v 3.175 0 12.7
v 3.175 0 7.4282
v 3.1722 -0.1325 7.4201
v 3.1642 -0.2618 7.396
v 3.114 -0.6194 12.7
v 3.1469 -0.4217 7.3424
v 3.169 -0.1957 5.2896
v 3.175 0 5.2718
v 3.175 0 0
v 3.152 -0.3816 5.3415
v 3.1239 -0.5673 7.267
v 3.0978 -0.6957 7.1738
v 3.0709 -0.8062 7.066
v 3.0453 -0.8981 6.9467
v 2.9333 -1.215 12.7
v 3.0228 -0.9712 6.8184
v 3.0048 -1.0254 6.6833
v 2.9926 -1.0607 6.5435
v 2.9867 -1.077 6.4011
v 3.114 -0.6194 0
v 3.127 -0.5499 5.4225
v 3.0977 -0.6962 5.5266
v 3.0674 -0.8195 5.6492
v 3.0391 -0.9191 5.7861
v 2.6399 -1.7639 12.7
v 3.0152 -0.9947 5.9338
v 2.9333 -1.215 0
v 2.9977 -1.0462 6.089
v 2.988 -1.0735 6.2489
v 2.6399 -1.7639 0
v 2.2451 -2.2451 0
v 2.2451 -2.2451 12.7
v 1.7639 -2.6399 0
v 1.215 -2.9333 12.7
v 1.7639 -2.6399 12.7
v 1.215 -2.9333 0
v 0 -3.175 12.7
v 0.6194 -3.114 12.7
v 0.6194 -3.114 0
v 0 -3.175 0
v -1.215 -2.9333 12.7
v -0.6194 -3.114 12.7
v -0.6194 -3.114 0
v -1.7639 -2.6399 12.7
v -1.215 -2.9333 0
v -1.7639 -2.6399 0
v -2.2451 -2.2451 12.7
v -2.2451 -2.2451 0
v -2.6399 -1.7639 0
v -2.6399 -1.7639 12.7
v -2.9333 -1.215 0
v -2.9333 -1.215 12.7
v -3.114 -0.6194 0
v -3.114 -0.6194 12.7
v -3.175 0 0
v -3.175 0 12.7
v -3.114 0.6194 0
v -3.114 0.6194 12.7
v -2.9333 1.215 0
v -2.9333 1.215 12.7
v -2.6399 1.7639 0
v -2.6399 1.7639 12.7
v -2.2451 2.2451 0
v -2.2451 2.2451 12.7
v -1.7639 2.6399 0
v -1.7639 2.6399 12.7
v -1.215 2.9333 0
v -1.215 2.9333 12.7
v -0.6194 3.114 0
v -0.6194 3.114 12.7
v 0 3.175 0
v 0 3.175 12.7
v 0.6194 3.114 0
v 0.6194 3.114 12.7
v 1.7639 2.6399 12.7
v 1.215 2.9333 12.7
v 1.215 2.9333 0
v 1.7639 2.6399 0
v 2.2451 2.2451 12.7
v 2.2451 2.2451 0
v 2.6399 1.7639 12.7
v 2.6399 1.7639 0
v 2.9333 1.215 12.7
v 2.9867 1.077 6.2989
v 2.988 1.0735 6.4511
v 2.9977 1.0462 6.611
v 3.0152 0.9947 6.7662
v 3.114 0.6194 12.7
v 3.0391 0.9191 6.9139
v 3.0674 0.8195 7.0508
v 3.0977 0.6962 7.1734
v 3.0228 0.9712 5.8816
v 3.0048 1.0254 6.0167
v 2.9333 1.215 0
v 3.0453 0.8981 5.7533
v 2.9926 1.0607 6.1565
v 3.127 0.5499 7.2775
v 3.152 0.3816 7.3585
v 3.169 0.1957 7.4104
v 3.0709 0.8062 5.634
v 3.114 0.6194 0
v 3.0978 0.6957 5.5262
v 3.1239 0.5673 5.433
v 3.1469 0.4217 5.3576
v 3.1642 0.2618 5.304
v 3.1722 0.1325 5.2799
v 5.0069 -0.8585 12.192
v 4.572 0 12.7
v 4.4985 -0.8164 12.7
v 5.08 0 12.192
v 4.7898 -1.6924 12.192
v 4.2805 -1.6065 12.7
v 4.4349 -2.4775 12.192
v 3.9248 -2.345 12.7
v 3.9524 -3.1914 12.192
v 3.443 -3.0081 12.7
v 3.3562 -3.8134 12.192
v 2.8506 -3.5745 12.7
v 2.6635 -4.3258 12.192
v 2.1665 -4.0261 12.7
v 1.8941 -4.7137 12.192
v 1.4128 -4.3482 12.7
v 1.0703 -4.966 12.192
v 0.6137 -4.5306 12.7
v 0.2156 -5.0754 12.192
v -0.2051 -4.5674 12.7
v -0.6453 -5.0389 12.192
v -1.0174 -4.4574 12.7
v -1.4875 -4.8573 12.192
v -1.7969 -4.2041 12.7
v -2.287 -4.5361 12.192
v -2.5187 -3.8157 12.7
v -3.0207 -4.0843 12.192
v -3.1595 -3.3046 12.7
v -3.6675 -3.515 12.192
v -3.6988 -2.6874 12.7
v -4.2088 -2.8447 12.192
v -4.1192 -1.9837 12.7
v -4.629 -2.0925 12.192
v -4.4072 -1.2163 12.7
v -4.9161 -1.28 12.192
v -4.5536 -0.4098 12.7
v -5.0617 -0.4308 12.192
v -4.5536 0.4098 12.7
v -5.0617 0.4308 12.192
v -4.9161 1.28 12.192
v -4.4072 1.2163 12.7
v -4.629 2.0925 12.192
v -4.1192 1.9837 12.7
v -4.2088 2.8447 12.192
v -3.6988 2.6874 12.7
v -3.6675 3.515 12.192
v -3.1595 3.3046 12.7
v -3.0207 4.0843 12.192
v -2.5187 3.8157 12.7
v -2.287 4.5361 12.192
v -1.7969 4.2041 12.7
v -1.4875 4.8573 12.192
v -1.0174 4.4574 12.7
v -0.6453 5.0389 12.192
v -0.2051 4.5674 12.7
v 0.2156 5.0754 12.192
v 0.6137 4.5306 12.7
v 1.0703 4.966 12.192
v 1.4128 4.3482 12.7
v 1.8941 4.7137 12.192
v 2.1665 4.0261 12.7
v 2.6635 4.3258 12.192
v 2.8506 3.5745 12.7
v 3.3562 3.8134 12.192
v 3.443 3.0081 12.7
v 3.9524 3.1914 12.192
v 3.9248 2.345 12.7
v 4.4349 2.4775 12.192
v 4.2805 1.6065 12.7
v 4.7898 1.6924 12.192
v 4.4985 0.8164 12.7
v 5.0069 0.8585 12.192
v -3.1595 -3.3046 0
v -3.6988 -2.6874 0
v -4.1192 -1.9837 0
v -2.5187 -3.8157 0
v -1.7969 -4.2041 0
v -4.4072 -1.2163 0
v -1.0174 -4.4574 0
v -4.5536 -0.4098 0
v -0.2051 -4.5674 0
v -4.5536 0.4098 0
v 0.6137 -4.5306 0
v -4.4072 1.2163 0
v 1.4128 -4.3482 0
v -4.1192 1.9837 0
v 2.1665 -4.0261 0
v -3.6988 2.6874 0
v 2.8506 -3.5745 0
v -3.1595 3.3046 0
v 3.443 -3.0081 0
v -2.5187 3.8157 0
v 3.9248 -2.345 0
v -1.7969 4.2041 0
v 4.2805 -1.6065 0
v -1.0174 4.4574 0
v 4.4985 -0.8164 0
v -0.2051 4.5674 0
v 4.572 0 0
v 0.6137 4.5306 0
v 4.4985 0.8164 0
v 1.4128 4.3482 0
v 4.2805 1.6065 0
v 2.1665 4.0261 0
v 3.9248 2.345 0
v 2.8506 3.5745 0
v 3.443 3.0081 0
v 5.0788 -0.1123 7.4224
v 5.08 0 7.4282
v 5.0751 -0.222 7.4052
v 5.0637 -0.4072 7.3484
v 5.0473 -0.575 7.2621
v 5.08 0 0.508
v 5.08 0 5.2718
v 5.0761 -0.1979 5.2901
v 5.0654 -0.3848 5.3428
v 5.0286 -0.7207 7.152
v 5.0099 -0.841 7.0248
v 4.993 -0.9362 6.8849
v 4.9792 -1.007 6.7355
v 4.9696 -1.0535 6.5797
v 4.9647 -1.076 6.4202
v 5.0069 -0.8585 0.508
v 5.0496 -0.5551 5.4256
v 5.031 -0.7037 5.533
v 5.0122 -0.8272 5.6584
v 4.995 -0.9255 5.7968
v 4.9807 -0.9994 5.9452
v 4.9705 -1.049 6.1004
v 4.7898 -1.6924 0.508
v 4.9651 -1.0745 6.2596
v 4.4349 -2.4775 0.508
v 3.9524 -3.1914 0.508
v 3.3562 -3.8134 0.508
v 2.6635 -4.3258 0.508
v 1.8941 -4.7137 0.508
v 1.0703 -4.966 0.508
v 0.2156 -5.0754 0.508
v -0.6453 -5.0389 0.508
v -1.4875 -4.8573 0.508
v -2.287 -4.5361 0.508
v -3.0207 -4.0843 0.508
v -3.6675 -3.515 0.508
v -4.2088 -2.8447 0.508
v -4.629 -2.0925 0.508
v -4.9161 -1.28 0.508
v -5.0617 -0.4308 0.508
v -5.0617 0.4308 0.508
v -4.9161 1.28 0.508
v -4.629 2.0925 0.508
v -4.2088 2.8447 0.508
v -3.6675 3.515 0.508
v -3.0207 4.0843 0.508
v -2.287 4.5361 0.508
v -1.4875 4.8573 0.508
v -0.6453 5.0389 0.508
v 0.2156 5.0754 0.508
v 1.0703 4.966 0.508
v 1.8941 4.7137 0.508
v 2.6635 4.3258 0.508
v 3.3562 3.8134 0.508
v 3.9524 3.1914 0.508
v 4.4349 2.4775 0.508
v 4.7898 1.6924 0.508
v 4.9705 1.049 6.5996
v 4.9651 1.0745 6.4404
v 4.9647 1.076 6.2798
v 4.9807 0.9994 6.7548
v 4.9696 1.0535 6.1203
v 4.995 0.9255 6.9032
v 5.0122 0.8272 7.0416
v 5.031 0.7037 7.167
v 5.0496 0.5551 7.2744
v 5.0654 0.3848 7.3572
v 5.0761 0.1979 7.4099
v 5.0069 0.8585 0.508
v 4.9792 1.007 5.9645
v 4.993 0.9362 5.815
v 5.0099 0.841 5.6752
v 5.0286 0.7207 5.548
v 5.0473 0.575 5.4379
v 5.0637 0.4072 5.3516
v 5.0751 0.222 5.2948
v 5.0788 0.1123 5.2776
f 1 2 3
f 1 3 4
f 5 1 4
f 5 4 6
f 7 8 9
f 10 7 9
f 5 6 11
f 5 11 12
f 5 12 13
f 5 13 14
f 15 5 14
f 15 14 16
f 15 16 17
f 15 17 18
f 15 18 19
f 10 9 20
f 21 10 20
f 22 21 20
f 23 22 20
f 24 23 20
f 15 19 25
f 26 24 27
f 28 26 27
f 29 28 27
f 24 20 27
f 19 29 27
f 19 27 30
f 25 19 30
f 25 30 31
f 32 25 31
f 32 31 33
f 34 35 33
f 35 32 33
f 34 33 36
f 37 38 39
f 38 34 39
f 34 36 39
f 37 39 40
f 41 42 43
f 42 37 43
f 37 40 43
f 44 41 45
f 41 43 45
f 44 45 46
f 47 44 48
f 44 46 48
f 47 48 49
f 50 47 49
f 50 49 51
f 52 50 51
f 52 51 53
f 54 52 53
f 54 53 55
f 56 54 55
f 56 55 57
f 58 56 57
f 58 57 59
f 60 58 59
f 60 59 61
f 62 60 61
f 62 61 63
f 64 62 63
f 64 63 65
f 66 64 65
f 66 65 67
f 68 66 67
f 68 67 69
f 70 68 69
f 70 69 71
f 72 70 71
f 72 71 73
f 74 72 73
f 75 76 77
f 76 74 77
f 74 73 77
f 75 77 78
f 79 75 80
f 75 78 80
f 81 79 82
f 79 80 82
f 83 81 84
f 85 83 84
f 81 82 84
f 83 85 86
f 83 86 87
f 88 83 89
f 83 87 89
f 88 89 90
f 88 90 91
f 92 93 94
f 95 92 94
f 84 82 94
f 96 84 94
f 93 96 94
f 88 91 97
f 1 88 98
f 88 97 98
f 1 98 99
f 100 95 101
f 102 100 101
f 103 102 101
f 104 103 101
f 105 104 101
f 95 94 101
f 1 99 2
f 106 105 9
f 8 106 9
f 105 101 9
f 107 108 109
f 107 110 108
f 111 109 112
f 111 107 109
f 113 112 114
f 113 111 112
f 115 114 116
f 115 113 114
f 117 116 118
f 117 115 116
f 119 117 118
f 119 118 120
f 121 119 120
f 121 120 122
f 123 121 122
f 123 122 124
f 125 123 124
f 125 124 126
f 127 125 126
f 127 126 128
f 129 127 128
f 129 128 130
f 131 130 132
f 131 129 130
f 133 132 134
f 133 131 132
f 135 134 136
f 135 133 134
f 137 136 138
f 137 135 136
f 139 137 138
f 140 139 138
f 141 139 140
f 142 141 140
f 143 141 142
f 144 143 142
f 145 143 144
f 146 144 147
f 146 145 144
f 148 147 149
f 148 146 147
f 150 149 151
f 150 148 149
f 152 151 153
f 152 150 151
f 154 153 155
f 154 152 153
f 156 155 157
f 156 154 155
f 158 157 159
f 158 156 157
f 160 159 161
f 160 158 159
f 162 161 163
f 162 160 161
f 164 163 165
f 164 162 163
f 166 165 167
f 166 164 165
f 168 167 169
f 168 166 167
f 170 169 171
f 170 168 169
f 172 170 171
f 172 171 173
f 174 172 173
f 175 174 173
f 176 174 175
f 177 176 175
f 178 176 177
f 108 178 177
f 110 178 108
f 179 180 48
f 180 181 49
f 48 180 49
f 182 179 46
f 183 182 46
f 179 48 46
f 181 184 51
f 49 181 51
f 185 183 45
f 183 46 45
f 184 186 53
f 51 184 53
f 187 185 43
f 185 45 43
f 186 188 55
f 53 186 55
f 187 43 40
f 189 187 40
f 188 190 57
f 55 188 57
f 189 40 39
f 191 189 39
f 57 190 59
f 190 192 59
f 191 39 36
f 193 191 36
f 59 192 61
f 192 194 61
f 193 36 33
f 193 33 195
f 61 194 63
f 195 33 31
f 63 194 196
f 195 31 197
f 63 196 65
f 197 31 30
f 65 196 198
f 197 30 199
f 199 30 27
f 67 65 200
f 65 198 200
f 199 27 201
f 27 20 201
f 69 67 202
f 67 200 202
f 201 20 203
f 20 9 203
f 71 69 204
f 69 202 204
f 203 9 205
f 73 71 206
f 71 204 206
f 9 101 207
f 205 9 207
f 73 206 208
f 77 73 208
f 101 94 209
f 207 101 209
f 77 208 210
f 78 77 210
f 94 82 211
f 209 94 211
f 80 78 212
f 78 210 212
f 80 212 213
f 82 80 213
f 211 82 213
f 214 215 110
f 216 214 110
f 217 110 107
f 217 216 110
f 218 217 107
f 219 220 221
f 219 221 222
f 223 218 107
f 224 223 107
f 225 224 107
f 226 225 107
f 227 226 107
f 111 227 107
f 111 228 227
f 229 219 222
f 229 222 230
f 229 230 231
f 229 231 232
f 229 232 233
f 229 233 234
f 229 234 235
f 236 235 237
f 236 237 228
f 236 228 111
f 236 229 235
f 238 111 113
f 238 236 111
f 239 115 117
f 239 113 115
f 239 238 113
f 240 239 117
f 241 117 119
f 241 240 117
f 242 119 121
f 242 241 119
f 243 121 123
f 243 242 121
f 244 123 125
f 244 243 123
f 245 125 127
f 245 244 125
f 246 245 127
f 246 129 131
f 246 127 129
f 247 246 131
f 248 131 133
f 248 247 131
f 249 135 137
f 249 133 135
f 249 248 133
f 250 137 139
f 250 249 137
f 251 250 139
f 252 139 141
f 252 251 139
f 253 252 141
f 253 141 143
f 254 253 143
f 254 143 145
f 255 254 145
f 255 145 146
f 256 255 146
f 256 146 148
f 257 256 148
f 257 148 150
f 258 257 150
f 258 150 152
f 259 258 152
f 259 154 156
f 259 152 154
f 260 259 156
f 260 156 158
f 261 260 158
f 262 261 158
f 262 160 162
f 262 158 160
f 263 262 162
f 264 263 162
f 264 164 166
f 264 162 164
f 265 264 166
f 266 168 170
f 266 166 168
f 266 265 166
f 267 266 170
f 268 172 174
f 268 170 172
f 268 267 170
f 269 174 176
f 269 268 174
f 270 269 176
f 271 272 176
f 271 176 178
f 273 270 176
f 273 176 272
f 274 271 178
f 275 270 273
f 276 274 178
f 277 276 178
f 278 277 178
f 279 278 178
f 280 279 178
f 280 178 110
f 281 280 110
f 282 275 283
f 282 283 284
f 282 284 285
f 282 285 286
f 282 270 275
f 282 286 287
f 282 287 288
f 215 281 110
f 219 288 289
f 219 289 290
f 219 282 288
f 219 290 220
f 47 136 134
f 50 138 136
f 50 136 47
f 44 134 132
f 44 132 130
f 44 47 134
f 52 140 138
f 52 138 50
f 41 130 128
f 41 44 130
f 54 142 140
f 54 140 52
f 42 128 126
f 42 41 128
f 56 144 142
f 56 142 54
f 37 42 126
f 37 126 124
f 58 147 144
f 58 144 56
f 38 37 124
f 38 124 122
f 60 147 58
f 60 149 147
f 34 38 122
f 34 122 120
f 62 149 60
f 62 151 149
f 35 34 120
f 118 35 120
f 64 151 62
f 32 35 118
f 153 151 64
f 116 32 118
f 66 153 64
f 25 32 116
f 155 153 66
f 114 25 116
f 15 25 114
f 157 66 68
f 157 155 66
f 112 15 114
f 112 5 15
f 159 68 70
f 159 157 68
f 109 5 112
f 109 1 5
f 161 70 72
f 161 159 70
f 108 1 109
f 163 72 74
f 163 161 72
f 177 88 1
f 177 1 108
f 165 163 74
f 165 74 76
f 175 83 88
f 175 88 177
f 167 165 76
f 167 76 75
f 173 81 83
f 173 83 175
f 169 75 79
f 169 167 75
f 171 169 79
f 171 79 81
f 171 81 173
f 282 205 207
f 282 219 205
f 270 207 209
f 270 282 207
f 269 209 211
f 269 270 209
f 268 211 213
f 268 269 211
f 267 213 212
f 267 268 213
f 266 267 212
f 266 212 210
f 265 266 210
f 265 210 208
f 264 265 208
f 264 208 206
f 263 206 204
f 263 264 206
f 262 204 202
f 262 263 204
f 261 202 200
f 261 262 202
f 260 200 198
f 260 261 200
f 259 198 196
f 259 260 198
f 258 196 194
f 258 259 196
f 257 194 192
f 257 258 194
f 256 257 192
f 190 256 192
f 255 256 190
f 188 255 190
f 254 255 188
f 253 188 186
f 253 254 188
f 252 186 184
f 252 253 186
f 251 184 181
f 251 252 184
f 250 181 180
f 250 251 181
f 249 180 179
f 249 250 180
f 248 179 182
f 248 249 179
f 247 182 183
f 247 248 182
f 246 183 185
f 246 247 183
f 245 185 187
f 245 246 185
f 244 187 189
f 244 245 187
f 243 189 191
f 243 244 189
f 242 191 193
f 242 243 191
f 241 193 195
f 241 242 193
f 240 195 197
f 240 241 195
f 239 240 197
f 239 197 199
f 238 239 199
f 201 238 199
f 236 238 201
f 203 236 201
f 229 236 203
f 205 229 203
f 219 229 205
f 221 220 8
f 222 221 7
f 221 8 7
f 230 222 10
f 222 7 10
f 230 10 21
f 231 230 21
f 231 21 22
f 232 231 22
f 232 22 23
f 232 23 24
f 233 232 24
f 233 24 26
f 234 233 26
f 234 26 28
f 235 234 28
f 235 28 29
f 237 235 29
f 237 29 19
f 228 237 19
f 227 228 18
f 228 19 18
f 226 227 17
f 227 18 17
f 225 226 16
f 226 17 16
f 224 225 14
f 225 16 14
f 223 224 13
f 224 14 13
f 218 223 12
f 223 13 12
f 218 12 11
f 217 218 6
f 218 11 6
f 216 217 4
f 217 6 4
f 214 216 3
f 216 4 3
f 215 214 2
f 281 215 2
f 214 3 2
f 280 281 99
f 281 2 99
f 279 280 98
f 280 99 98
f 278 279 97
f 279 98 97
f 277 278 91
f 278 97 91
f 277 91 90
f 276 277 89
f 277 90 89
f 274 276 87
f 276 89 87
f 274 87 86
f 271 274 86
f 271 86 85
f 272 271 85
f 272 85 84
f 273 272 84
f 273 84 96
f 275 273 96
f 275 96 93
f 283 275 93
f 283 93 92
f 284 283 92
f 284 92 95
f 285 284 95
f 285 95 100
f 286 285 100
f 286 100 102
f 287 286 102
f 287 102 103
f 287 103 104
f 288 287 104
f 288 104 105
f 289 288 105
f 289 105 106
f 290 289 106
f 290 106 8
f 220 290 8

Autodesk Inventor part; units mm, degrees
ref_plane "XZ Plane" through (0, 0, 0) normal (0, 1, 0) x (-1, 0, 0)
ref_plane "XY Plane" through (0, 0, 0) normal (0, 0, 1) x (1, 0, 0)
sketch "Sketch1" plane through (0, 0, 0) normal (0, 0, 1) x (1, 0, 0)
  circle A0 centre (0, 0) radius 3.175
  circle A1 centre (0, 0) radius 5.08
  dimension "d0" = 6.35
  dimension "d1" = 10.16
extrude "Extrusion1" add sketch "Sketch1" along normal blind 12.7
chamfer "Chamfer1" distance 0.508 angle 45 2 edges at (-5.08, 0, 12.7) (-5.08, 0, 0)
ref_plane "Work Plane1" through (6.35, 0, 0) normal (1, 0, 0) x (0, 1, 0)
sketch "Sketch2" plane through (6.35, 0, 0) normal (1, 0, 0) x (0, 1, 0)
  circle A0 centre (0, 6.35) radius 1.1282
  point P0 (0, 0)
  dimension "d8" = 6.35
hole "Hole1" at (6.35, 0, 6.35) direction (-1, 0, 0) diameter 2.1565 depth 6.35 thread size "4-40 UNC" class "2B" standard "ANSI Unified Screw Threads"
properties part number "Carriage Axle Set Screw Holder"
